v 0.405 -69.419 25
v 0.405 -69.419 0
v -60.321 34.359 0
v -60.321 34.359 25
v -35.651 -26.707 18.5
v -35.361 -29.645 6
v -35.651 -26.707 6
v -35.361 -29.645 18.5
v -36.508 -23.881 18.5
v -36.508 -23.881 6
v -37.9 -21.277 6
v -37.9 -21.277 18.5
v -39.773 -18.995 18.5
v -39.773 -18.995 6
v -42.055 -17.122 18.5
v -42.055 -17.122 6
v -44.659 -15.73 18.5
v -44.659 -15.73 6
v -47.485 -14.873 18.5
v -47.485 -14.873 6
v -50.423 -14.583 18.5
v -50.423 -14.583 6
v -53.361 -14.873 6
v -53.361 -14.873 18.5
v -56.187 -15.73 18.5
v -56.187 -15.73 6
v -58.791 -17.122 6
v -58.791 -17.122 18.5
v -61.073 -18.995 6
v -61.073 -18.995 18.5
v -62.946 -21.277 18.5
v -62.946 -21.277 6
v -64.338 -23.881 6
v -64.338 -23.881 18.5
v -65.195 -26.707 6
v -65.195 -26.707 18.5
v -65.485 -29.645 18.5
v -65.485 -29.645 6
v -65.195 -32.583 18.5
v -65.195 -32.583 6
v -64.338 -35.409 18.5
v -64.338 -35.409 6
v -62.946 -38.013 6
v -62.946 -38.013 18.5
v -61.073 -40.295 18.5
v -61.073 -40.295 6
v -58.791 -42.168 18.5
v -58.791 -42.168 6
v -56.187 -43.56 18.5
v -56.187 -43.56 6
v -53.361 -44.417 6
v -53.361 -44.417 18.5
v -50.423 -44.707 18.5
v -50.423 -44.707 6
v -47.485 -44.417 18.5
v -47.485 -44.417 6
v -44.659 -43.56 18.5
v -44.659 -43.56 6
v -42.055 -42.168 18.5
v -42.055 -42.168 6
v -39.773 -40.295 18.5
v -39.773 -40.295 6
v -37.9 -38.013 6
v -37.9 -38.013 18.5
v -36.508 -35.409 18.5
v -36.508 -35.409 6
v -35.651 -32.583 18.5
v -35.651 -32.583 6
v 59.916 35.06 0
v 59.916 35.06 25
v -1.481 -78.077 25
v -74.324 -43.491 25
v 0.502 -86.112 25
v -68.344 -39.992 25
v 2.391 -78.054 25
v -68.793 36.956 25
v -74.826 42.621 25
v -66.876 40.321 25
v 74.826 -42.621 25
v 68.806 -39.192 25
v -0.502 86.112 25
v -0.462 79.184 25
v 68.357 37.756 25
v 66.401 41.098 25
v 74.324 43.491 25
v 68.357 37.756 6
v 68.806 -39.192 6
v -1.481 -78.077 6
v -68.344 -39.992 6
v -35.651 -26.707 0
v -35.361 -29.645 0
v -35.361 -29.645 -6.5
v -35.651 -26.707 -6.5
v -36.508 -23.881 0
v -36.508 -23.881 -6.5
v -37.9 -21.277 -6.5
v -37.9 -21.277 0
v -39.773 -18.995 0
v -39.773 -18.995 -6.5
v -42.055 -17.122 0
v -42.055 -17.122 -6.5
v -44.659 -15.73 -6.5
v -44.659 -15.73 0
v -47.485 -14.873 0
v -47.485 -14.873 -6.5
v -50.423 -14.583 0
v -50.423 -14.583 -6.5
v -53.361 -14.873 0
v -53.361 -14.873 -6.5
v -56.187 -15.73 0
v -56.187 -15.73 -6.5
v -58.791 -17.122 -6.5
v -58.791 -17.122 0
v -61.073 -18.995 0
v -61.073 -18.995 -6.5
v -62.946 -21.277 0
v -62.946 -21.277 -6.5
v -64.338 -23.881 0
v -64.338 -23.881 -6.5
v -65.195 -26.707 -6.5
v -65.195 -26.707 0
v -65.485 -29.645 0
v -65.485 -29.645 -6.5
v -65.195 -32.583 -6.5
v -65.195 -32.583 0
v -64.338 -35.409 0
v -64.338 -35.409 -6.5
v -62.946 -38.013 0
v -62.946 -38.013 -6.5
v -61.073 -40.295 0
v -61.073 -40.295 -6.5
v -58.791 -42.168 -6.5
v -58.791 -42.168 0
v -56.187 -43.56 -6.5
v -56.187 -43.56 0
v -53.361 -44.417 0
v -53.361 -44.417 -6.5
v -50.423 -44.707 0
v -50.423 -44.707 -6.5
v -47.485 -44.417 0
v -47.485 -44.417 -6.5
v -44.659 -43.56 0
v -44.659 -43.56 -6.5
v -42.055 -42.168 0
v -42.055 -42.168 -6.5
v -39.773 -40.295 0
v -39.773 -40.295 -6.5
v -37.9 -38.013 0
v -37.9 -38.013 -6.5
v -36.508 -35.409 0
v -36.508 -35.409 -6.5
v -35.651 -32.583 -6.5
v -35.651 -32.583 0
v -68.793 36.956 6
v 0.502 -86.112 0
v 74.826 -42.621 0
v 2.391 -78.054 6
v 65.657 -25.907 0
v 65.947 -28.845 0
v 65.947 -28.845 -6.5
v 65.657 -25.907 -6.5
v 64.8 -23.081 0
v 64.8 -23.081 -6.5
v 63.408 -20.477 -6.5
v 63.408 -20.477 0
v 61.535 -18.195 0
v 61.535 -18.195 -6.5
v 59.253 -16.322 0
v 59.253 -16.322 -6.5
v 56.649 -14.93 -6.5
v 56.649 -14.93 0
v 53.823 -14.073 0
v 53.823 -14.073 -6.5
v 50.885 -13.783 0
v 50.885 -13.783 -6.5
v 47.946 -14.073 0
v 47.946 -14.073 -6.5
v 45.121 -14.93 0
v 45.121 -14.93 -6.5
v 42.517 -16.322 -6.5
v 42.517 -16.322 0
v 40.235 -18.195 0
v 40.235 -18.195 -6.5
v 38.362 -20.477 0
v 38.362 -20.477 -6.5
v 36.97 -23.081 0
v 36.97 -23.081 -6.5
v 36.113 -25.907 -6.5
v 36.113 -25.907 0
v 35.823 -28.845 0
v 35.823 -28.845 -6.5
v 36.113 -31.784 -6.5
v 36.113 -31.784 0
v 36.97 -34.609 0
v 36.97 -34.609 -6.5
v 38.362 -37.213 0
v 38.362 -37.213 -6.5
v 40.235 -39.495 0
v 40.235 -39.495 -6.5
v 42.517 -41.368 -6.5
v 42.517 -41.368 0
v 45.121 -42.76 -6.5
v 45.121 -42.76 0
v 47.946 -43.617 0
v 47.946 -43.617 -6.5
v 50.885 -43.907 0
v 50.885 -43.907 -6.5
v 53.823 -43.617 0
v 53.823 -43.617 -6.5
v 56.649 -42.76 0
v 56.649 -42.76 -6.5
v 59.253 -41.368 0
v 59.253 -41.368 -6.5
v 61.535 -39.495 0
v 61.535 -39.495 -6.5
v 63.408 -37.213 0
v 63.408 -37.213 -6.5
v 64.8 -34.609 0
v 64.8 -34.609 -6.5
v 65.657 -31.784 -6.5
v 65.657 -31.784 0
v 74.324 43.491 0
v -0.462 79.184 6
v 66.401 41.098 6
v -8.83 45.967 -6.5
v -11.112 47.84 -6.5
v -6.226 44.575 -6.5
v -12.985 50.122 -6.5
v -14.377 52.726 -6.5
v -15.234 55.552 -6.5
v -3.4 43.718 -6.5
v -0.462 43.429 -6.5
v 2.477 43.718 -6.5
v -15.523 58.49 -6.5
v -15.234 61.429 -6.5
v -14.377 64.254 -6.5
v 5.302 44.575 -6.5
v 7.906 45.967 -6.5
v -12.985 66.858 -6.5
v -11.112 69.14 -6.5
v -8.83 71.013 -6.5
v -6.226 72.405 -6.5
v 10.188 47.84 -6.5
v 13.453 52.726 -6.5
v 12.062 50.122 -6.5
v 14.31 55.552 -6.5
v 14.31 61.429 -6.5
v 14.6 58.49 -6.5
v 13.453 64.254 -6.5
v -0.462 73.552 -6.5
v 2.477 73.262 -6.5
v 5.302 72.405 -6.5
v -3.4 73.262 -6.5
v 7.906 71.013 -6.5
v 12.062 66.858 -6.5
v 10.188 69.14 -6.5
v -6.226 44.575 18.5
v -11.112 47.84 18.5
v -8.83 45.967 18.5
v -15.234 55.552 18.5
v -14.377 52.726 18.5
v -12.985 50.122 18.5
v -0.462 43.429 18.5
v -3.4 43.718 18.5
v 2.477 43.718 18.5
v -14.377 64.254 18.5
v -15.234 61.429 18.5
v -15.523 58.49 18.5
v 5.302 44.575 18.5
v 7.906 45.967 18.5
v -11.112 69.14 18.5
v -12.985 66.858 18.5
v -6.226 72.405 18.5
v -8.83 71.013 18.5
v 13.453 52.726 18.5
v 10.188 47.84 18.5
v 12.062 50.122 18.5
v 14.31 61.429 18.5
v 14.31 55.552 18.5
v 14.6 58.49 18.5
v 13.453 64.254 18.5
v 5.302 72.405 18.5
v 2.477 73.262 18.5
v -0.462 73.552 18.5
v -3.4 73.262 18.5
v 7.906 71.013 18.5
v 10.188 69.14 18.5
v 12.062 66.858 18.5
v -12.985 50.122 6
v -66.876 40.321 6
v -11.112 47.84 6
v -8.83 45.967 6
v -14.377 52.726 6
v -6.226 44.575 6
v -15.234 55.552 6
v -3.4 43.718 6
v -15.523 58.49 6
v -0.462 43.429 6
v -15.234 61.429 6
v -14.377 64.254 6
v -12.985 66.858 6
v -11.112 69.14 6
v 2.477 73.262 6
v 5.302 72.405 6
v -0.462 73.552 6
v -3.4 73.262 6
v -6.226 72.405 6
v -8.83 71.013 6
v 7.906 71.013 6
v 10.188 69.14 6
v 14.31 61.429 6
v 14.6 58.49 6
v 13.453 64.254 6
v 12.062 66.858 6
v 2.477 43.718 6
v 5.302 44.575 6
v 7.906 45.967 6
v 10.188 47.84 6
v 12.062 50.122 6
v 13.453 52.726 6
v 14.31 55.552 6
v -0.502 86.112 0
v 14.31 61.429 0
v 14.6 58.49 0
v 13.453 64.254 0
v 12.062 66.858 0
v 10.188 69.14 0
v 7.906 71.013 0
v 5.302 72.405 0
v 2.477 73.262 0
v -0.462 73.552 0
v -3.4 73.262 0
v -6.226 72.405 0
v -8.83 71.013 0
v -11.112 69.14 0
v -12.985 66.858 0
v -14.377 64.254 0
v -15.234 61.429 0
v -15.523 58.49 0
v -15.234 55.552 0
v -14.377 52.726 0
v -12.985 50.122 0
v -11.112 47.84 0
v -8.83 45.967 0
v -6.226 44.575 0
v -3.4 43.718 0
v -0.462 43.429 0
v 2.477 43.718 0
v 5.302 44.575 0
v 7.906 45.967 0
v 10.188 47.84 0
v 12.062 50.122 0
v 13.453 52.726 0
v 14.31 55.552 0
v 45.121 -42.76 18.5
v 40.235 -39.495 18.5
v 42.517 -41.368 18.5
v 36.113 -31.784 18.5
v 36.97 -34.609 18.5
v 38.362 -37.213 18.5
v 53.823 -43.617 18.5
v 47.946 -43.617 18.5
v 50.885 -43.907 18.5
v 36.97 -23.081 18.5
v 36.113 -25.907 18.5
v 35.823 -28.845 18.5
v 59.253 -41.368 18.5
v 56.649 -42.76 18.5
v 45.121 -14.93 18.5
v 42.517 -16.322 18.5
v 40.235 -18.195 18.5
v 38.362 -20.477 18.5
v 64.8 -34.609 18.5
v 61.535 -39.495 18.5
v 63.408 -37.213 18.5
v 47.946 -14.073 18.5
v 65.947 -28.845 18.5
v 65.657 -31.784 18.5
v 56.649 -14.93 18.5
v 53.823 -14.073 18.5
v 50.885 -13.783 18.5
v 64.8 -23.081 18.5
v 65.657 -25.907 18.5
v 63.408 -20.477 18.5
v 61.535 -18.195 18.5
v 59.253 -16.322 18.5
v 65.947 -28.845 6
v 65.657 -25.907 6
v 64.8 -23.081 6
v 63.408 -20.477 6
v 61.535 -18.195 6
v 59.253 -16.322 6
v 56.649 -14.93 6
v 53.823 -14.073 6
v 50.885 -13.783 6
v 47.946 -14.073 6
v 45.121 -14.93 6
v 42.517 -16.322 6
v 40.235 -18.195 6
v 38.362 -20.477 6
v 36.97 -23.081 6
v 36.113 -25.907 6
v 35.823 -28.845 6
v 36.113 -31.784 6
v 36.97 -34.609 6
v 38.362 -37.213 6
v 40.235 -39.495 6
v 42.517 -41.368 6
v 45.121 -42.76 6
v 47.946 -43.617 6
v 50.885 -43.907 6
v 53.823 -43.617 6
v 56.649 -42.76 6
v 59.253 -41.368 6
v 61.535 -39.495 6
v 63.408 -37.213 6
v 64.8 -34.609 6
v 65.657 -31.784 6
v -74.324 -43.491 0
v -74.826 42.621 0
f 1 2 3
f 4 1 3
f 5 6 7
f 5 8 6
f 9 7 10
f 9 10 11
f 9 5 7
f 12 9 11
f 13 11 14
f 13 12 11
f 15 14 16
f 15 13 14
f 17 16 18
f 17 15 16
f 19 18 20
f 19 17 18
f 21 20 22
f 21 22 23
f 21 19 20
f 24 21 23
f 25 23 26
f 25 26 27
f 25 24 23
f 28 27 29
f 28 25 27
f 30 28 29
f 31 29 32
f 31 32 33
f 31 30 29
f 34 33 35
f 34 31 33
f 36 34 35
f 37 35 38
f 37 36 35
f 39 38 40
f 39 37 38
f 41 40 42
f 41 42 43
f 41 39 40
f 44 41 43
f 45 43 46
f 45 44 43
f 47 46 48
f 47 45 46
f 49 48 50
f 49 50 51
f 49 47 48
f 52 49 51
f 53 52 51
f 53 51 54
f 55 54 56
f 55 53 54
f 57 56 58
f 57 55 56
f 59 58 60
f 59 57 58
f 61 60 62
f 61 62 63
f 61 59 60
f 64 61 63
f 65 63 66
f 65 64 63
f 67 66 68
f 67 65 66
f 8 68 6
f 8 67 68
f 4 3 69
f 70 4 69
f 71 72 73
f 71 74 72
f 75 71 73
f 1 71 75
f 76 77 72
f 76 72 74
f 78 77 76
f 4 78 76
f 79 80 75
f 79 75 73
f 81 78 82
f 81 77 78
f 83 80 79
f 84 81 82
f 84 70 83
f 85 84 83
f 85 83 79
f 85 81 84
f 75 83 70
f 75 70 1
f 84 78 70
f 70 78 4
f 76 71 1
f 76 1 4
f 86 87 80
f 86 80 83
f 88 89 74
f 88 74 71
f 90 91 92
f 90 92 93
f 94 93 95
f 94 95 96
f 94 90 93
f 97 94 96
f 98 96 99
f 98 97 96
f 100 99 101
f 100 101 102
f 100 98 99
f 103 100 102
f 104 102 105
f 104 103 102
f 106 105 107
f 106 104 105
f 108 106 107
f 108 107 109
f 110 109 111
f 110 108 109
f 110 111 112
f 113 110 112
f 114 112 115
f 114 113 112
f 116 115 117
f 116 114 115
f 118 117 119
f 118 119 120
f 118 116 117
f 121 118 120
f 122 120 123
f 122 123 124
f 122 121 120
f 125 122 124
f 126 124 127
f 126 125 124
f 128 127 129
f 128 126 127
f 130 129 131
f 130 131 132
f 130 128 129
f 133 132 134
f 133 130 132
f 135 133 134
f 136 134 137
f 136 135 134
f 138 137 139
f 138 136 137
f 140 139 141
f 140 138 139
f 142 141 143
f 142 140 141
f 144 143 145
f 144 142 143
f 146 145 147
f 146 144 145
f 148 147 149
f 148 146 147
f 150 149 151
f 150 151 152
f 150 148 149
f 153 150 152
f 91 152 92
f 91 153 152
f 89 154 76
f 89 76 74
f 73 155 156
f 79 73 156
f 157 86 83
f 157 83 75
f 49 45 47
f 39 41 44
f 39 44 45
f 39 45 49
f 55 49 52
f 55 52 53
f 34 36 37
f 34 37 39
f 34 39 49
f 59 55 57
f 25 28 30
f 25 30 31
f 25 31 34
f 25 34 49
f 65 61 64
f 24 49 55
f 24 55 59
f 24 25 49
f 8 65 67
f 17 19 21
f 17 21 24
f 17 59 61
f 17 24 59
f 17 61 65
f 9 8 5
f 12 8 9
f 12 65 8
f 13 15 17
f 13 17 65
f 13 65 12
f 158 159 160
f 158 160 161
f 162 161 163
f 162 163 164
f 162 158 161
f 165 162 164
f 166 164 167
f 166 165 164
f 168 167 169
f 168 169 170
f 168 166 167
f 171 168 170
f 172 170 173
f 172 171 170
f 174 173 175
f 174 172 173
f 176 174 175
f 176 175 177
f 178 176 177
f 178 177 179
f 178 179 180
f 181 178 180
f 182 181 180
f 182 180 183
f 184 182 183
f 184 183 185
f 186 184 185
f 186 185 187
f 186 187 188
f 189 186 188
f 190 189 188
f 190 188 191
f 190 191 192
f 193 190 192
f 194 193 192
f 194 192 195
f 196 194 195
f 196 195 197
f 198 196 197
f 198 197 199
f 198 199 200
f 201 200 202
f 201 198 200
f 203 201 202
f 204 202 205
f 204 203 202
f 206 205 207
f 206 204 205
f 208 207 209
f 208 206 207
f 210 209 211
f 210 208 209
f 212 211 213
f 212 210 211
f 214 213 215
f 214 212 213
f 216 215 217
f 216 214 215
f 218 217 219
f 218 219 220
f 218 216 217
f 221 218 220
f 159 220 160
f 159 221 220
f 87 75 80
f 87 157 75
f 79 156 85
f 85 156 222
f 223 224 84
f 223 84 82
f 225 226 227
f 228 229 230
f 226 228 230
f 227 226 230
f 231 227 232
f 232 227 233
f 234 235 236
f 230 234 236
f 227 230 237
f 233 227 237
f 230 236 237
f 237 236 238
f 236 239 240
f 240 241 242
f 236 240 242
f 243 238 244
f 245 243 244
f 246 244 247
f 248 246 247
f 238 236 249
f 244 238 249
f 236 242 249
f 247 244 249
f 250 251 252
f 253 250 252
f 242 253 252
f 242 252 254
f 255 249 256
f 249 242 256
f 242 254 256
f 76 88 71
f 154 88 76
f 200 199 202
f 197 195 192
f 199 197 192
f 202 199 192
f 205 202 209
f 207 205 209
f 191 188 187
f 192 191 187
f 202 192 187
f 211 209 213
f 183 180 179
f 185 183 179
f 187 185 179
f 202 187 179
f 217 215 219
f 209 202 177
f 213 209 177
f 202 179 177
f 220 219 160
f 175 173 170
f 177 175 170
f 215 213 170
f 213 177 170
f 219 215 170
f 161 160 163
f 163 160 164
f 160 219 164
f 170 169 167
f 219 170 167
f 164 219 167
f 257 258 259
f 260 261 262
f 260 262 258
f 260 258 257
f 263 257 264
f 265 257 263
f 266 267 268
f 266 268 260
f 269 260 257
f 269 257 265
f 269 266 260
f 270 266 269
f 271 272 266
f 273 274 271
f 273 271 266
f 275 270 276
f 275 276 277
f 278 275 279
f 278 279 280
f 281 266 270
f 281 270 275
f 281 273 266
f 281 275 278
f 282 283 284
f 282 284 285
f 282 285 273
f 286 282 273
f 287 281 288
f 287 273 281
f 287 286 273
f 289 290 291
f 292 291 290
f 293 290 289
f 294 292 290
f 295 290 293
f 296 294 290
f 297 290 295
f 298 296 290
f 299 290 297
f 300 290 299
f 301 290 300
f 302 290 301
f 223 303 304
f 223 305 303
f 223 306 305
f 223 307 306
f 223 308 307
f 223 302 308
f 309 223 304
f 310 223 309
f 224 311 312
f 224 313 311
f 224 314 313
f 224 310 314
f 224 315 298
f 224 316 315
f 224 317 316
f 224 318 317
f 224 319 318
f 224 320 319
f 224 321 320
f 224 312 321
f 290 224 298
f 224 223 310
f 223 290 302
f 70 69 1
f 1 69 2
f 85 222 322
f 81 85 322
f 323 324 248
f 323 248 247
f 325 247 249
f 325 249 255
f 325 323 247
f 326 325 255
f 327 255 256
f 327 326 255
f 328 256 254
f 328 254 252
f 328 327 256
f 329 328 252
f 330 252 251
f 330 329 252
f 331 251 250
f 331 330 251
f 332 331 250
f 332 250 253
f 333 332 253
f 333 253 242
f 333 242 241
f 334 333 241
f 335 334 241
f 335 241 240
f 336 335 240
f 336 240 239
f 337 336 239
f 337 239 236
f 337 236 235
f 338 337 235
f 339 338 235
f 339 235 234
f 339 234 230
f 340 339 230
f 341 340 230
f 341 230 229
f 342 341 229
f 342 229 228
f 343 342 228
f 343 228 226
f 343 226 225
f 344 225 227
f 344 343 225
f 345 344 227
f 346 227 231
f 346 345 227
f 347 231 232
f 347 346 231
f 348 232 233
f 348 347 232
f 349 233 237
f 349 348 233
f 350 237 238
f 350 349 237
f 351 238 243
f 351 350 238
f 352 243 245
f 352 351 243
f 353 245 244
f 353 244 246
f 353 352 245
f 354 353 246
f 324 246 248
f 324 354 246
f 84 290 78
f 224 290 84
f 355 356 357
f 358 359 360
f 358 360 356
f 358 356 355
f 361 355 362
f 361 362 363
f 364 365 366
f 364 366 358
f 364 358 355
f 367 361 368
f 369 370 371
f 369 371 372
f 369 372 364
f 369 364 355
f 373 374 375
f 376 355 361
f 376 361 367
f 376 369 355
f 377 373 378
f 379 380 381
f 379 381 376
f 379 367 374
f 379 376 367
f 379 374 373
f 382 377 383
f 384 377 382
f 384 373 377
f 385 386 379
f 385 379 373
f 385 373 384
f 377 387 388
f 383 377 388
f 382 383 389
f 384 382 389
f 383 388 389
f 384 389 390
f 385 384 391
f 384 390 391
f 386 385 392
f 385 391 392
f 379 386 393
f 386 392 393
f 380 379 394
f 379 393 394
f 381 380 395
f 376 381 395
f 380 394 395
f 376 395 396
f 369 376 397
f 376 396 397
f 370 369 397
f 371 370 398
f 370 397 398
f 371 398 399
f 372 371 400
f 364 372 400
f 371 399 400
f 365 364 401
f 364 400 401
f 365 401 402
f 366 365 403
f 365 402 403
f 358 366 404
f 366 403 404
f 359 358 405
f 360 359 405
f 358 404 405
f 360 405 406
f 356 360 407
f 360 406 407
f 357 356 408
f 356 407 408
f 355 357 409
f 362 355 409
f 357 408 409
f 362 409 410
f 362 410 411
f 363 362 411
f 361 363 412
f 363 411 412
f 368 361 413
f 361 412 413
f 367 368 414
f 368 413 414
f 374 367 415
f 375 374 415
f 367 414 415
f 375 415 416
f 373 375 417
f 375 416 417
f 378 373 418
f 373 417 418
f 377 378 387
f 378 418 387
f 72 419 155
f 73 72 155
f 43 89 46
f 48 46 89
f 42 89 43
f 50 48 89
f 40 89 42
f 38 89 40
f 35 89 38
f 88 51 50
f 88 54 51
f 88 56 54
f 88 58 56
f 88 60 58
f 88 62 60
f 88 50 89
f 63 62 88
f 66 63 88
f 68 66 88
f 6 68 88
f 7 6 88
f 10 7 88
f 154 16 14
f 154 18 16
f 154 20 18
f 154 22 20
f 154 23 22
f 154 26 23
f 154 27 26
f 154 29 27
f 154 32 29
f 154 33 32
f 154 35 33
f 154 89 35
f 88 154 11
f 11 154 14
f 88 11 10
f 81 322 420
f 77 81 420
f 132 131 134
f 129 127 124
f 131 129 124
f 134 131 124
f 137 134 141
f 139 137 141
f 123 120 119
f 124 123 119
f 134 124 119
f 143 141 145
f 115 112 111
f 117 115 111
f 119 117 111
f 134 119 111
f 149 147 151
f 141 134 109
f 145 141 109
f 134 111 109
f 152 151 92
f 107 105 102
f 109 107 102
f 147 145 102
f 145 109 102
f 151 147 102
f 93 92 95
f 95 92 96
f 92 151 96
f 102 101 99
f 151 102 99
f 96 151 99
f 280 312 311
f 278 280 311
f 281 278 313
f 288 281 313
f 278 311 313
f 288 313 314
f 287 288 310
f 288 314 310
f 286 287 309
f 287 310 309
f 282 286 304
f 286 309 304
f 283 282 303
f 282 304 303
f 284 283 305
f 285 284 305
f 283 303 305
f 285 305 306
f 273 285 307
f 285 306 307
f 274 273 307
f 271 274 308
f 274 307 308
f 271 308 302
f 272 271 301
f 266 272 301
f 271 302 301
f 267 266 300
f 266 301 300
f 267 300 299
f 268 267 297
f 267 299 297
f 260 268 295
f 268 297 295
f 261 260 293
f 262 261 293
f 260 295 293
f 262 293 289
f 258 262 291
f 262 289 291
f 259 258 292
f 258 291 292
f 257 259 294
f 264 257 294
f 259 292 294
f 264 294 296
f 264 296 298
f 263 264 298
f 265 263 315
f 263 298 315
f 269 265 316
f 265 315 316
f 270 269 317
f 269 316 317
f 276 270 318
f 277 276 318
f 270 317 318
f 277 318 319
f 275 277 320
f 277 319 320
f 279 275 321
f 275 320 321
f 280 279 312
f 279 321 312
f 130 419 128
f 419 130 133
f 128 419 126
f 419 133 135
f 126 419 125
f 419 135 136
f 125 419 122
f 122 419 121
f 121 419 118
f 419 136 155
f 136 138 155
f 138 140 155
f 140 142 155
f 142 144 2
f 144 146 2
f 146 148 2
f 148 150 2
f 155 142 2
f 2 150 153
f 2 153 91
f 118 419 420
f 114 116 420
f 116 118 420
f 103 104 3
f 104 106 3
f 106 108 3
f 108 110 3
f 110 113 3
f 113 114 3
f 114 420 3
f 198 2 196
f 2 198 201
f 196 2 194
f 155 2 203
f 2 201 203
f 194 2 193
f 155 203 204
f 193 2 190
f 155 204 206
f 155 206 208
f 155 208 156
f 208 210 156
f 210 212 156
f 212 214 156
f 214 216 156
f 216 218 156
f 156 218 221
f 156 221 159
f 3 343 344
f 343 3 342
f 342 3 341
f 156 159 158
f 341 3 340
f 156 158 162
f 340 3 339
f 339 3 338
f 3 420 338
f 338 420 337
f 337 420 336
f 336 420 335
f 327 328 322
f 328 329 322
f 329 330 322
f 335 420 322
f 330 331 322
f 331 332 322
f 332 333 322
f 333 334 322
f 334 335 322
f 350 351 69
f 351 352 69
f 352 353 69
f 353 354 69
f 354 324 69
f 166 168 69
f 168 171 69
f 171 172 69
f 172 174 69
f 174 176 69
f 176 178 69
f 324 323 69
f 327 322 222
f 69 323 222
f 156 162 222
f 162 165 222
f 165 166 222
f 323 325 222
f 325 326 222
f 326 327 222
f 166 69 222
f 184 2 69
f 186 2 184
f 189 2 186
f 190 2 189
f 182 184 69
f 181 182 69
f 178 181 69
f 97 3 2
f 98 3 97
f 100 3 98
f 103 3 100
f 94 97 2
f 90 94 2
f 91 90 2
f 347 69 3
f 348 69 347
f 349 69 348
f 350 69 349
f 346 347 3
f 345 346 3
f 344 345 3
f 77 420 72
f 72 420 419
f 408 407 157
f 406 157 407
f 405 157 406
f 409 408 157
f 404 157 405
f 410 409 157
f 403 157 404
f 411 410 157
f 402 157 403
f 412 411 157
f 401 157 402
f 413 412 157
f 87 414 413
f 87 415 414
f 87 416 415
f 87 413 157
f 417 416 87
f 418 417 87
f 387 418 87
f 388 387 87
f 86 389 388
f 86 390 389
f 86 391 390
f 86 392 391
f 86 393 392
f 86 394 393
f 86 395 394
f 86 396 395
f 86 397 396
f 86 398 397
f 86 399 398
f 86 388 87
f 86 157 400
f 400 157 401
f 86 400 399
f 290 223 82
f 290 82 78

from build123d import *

# Parameters (mm, degrees)
F1_DEPTH = 25
F2_T     = -6
F4_R     = 15.0616711188
F5_DEPTH = 12.5


with BuildPart() as f1:
    # F0 (on Top) → F1 (new body)
    with BuildSketch(Plane.XY):
        Polygon((74.3237713212, 43.4907621871), (-0.5022192234, 86.1116551627), (-74.8259905445, 42.6208929757), (-74.3237713212, -43.4907621871), (0.5022192234, -86.1116551627), (74.8259905445, -42.6208929757), align=None)
        Polygon((0.4048665783, -69.4193482725), (-60.3213524073, 34.3590493943), (59.916485829, 35.0602988782), align=None, mode=Mode.SUBTRACT)
    extrude(amount=F1_DEPTH)

    # F2
    f2_openings = [f1.faces().sort_by_distance(p)[0] for p in [
        (35.781524, 62.818673, 25),
    ]]
    offset(amount=F2_T, openings=f2_openings, kind=Kind.INTERSECTION)

    # F4 (on face) → F5 (join, symmetric)
    with BuildSketch(Plane.XY.offset(6)):
        with Locations((-0.461813338, 58.4901720285)):
            Circle(F4_R)
        with Locations((50.8848815174, -28.8451439318)):
            Circle(F4_R)
        with Locations((-50.4230681795, -29.6450280968)):
            Circle(F4_R)
    extrude(amount=F5_DEPTH, both=True)


with BuildPart() as f1b:
    # F0 (on Top) → F1, piece 2 (new body)
    with BuildSketch(Plane.XY):
        Polygon((29.9582429145, 17.5301494391), (-30.1606762036, 17.1795246971), (0.2024332891, -34.7096741362), align=None)
    extrude(amount=F1_DEPTH)


solid = f1.part
